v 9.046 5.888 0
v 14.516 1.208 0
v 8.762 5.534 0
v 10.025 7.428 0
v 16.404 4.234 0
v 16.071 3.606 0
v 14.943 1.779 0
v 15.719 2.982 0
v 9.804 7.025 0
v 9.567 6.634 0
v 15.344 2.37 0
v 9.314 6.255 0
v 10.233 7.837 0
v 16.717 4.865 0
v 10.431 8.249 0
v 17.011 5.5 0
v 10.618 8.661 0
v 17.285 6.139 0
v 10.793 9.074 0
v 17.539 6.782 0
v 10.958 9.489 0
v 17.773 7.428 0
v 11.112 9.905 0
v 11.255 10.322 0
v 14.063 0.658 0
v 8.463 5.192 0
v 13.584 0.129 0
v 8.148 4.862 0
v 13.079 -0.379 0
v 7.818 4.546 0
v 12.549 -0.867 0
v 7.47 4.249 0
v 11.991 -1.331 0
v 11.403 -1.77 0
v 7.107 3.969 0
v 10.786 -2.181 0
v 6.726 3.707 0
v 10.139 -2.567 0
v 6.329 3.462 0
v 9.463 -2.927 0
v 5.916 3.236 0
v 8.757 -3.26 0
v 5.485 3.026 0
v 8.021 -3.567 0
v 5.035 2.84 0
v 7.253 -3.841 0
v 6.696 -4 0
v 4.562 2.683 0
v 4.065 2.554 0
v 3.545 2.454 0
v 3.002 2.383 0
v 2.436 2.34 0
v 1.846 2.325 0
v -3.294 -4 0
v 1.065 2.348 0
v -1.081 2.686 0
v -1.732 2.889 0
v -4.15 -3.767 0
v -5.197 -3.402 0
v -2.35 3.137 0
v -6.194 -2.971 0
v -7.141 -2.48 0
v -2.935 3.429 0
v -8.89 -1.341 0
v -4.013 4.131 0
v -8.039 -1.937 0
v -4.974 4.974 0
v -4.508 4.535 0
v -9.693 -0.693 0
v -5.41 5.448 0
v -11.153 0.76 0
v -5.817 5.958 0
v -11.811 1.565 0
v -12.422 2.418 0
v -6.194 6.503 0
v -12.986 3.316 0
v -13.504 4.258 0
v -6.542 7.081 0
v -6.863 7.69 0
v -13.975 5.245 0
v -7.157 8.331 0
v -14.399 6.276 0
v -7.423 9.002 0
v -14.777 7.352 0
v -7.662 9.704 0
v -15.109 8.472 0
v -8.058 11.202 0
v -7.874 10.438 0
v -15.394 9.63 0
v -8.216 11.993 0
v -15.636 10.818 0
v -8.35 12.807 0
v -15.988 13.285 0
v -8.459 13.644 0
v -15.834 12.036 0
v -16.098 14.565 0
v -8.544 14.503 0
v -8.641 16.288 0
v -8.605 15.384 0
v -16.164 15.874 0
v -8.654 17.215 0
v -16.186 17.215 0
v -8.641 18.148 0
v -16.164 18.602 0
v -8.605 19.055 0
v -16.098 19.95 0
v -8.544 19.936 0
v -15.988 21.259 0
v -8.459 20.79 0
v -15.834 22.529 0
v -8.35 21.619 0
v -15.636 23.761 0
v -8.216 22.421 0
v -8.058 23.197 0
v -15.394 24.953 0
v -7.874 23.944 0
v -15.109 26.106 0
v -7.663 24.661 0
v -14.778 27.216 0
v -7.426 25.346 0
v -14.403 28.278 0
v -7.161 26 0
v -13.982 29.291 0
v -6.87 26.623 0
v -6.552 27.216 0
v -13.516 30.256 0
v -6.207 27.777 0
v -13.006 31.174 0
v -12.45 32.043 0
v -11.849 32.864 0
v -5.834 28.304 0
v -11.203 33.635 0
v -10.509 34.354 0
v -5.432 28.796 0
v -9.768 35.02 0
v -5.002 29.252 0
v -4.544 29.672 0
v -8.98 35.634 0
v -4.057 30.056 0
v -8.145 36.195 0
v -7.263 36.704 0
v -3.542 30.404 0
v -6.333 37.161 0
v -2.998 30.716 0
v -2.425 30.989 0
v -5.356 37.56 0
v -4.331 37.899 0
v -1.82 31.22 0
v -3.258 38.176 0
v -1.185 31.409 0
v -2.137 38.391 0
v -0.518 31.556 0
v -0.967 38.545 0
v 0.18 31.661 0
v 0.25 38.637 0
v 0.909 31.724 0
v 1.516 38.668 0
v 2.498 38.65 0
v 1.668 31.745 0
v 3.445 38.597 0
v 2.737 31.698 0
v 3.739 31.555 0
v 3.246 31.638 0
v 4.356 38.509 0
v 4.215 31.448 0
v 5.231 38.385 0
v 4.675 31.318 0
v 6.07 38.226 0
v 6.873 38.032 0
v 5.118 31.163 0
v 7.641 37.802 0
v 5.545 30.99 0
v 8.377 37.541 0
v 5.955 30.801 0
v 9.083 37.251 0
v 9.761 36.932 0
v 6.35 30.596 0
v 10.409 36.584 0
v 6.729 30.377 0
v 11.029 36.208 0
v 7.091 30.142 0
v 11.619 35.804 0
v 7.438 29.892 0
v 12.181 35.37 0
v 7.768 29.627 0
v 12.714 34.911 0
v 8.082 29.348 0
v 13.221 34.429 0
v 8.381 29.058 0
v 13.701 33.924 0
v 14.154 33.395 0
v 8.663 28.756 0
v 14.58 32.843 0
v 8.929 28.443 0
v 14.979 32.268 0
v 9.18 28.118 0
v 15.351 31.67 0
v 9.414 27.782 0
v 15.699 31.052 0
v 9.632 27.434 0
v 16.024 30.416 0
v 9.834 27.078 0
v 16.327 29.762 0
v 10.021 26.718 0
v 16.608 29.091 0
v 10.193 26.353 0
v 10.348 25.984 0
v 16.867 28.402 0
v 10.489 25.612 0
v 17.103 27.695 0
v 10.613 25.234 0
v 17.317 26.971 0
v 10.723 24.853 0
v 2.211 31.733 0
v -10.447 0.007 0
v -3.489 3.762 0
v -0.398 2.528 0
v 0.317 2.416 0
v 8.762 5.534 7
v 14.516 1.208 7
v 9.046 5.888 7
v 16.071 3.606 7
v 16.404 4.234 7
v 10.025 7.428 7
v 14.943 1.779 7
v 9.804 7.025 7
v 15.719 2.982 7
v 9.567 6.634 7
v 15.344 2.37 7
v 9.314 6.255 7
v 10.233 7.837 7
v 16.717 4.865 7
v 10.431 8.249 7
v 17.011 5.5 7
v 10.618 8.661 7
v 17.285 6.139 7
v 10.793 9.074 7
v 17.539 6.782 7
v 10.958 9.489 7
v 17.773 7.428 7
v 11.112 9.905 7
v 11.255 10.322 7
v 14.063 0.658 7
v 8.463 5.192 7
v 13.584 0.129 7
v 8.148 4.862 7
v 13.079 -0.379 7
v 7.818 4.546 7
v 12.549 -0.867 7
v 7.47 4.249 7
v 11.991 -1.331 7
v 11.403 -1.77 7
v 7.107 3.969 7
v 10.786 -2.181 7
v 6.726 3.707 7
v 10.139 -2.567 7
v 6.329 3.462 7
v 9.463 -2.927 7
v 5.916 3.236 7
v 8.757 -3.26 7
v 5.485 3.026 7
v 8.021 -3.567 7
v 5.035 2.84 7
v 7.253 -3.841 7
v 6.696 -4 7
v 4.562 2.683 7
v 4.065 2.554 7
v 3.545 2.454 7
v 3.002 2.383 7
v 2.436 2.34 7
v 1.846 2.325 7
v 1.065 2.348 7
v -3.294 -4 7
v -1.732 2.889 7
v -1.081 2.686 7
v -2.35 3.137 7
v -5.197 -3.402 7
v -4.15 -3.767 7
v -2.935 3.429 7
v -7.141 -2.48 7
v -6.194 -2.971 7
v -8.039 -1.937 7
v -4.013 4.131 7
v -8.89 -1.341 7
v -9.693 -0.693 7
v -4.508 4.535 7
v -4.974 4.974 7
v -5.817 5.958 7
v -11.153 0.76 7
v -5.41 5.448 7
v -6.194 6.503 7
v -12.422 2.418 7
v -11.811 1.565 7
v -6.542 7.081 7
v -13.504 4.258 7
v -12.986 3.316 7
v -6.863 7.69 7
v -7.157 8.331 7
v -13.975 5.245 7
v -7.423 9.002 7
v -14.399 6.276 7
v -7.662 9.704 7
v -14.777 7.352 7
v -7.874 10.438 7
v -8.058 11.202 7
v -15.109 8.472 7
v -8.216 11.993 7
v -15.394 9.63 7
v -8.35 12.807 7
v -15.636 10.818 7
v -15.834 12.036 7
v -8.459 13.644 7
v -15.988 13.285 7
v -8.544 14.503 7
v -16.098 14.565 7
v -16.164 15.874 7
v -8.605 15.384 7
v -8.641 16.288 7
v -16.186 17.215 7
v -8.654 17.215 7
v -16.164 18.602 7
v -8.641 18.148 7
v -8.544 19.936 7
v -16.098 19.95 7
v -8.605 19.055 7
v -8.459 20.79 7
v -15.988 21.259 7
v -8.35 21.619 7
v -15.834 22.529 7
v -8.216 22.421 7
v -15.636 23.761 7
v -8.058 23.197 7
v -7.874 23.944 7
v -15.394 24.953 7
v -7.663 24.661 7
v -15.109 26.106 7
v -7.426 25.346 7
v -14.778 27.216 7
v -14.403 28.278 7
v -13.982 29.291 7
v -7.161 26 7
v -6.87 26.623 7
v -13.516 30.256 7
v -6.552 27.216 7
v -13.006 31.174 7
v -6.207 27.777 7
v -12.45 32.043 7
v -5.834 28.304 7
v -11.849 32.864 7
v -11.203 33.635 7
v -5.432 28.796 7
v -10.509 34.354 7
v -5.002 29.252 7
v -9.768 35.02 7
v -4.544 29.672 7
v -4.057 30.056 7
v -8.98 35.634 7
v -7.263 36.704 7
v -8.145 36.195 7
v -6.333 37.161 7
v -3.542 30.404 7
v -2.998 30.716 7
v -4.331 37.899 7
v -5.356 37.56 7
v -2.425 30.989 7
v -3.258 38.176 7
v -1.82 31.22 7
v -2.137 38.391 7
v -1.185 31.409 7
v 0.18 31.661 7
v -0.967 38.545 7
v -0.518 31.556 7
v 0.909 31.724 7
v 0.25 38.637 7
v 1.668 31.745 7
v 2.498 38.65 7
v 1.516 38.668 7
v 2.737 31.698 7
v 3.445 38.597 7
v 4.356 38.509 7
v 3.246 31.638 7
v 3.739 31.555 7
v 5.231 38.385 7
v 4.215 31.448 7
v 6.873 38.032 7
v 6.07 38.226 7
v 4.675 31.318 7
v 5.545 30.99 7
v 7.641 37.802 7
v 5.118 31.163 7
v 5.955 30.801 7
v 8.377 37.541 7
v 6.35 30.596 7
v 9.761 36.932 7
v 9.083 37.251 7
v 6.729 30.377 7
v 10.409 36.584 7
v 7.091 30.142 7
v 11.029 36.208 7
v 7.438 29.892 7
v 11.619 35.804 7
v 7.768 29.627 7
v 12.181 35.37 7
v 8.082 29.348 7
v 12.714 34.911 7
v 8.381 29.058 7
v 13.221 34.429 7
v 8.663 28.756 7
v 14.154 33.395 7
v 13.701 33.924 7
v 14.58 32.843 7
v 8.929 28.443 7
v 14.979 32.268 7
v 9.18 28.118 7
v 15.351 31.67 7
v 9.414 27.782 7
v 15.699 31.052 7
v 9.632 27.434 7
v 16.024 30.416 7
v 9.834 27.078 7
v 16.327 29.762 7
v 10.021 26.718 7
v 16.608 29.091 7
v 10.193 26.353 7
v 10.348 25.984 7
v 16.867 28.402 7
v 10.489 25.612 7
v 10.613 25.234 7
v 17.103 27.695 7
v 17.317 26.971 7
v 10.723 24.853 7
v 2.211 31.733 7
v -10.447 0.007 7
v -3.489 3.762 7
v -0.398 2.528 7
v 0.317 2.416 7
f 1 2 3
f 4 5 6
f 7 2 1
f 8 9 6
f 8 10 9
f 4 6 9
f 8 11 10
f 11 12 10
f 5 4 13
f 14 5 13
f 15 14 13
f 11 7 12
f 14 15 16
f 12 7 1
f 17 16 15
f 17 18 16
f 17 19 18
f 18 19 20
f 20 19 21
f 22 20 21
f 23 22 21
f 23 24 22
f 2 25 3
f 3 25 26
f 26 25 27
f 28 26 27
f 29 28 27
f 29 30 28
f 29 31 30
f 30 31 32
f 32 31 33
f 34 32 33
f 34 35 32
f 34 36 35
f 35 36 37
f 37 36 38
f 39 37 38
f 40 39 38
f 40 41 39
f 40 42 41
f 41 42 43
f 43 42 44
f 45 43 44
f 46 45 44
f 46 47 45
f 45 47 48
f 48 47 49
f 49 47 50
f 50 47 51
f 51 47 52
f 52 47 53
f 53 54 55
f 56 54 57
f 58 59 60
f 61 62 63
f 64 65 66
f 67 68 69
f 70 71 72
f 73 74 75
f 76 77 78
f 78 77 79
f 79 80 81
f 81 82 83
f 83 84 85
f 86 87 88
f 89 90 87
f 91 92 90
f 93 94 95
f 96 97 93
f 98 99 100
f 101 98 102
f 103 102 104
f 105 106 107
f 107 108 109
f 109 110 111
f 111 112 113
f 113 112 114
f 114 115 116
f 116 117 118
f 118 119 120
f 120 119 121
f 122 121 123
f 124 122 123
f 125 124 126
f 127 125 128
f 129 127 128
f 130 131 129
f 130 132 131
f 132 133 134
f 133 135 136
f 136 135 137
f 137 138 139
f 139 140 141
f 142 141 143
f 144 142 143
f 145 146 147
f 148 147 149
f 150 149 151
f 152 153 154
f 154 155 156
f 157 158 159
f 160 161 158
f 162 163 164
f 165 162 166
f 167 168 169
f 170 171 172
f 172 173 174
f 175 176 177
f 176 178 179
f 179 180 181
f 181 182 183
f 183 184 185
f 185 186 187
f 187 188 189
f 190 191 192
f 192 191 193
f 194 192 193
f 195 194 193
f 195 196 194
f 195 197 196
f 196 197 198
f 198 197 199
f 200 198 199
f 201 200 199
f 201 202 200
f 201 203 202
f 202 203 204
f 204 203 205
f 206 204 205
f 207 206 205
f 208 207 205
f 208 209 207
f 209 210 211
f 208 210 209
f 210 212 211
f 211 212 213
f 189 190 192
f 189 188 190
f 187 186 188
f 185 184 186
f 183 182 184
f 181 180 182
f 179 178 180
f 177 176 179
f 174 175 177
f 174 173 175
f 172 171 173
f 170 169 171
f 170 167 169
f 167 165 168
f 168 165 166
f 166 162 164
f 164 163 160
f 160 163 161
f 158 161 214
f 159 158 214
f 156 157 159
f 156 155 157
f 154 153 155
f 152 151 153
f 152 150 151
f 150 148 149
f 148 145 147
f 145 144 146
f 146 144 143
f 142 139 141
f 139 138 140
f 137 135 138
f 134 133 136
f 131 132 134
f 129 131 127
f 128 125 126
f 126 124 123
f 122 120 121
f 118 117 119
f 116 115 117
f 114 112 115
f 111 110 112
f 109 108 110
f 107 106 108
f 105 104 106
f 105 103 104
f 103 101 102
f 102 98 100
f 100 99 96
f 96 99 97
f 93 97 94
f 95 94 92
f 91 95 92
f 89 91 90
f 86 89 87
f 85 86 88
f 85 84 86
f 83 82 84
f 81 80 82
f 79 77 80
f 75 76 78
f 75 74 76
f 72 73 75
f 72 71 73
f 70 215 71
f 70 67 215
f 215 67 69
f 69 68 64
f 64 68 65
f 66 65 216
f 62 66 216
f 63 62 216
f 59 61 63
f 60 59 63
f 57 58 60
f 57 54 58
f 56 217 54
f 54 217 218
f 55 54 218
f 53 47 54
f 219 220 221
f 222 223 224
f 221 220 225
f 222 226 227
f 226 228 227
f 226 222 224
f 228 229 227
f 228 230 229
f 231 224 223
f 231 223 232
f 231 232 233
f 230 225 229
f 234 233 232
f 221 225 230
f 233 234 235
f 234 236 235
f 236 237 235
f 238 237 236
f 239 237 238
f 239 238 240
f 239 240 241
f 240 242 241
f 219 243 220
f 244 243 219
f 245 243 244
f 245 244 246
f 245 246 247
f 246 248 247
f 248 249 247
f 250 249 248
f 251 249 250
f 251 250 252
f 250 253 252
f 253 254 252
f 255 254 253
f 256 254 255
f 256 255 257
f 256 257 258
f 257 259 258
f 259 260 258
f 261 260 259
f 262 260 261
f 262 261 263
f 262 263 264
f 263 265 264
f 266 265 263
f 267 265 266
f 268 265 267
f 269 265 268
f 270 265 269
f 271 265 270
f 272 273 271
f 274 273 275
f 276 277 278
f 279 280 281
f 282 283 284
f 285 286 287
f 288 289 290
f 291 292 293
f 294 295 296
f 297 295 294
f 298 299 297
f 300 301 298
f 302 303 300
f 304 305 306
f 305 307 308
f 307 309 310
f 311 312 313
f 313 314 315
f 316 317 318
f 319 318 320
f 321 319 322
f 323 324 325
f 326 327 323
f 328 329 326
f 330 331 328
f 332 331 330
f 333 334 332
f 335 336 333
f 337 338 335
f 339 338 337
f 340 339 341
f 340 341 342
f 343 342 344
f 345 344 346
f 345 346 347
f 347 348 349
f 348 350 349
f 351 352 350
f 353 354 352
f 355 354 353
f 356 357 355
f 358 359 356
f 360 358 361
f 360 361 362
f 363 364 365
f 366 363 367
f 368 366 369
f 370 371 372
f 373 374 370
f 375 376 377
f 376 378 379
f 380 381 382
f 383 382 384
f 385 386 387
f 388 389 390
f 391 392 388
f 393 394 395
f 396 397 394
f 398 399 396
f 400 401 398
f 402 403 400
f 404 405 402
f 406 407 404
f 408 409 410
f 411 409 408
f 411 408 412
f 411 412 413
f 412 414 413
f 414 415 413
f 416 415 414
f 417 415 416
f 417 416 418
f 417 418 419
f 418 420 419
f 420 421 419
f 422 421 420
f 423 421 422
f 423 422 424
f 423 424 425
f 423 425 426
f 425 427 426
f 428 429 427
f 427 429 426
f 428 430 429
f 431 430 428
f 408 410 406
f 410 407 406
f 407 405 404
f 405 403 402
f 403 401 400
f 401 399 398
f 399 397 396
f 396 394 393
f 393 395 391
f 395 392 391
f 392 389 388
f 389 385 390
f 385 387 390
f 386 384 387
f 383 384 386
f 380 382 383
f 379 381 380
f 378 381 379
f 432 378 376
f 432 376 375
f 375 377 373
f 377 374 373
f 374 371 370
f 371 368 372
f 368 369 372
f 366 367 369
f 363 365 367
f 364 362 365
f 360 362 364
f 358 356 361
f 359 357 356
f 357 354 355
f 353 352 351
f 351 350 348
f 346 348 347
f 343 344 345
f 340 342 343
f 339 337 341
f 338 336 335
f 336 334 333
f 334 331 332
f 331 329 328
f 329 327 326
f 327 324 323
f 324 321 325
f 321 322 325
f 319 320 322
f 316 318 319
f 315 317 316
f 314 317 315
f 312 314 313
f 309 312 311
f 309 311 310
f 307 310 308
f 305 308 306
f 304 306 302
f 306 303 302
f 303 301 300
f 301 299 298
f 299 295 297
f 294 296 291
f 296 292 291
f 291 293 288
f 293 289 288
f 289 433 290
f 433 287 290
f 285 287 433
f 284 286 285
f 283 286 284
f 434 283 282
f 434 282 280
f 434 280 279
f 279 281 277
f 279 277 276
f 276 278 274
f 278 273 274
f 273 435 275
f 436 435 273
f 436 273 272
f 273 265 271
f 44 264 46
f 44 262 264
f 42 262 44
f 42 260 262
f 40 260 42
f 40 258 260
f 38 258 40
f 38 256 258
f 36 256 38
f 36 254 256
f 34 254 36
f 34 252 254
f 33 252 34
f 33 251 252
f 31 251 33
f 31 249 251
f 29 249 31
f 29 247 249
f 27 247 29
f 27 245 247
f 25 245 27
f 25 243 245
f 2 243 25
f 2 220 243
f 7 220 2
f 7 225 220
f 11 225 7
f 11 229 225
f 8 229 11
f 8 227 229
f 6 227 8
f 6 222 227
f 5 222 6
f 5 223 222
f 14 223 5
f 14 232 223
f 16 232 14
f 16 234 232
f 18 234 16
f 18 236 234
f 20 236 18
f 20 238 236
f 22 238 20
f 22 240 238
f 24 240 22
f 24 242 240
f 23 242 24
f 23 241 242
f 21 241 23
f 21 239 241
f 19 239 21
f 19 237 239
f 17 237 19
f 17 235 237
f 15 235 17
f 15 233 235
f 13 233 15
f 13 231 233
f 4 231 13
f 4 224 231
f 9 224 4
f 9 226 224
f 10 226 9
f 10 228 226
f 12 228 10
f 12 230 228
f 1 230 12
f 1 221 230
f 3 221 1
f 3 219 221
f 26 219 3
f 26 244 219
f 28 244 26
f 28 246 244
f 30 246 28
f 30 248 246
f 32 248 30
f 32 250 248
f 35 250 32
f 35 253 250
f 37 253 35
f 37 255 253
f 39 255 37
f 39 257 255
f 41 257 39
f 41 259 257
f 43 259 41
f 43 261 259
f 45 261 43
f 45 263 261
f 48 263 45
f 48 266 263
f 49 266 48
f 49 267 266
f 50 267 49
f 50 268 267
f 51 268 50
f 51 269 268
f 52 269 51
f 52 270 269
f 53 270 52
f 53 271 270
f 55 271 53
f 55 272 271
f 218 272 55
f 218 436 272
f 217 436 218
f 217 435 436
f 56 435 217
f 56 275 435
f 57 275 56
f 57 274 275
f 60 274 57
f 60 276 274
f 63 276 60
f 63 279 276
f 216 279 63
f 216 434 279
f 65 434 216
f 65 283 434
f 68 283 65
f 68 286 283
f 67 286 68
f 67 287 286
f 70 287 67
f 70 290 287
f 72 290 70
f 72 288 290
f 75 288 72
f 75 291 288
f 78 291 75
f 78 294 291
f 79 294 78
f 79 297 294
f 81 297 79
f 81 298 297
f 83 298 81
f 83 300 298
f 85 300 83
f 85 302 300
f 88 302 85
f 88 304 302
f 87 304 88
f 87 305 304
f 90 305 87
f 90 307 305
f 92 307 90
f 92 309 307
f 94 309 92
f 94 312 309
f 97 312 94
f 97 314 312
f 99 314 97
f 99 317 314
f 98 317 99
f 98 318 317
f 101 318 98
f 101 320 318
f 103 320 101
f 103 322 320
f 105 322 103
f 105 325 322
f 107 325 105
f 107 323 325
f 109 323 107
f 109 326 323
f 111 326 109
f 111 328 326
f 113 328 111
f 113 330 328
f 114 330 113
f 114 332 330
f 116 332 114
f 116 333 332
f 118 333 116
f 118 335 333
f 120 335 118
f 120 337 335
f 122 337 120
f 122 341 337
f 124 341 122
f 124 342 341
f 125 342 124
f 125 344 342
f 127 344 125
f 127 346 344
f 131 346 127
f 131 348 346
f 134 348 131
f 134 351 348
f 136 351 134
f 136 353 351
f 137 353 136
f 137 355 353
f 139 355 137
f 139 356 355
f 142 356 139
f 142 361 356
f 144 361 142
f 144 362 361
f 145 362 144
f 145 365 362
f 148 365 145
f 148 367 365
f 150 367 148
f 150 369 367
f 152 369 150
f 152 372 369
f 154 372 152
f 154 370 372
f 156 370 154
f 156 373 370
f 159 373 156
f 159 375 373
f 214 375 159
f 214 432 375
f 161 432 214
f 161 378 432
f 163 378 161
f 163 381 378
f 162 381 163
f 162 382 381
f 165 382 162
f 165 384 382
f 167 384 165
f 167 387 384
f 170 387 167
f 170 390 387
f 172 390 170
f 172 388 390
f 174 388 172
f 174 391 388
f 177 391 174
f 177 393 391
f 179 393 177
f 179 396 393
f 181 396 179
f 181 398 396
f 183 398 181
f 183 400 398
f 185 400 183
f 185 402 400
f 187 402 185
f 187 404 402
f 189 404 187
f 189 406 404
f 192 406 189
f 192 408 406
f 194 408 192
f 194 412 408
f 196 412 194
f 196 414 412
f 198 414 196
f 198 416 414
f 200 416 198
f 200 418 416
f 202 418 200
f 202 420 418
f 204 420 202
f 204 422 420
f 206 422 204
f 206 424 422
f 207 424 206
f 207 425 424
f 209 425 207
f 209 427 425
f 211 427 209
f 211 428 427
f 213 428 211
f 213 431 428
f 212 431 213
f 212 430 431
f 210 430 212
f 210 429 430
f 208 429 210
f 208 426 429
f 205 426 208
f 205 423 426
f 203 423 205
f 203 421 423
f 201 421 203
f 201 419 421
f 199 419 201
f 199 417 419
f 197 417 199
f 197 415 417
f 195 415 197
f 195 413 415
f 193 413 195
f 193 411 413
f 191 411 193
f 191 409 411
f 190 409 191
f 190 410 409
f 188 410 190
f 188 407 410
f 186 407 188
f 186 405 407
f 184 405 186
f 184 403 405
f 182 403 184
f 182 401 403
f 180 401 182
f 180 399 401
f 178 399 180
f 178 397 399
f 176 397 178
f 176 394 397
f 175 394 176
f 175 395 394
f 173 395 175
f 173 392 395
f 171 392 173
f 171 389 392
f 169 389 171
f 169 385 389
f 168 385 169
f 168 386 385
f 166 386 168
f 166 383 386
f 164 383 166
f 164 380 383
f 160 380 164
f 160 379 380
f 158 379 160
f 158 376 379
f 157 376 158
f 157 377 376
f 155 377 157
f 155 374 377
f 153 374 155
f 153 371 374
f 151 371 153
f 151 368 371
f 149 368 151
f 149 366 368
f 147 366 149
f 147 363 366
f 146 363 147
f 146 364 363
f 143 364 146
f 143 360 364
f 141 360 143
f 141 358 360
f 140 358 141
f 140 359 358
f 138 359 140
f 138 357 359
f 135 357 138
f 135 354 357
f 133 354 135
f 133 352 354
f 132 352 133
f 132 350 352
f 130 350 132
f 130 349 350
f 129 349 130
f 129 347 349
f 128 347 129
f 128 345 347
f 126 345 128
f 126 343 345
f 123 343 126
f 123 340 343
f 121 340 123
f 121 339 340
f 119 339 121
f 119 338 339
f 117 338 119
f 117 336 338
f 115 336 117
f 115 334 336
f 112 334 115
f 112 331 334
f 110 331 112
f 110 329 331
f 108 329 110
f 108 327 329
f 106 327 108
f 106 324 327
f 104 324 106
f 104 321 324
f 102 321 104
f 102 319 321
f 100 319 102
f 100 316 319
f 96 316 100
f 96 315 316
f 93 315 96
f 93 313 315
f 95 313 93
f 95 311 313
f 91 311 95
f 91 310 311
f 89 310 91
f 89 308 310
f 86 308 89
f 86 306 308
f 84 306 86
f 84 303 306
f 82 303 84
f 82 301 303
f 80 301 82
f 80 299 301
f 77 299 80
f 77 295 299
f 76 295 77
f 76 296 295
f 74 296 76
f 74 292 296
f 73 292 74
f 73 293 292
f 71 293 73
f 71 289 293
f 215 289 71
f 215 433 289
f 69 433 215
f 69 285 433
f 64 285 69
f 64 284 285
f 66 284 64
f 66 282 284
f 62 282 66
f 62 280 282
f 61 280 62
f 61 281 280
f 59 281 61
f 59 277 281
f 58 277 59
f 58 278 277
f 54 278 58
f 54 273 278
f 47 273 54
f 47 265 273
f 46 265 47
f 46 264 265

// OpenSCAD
// file: glyph.scad
// glyph — the shared geometry of every letter in the set. Defines named geometry
// only, so it renders nothing on its own; each letter part includes it and calls
// letter(). Every dimension lives in ../../lib/common.scad.
//
// A LETTER IS NOTHING BUT A LETTER. No plinth, no tongue, no tab — it is the
// bare glyph, and it attaches by standing in the deck groove and resting on the
// groove's floor. Anything else on it would be a distraction on a learning toy.
//
// It is a flat plate of one thickness, printed face-down: no overhang anywhere,
// no supports, and the face on the bed comes out smoothest.
//
// TWO TRAPS WITH text():
//
//  * A missing font FALLS BACK SILENTLY — no warning, no error, just different
//    letters. "Liberation Sans" was the first choice here because OpenSCAD
//    bundles it; on macOS the bundled faces are not registered with fontconfig,
//    so it rendered the fallback face instead and nothing said so. To check a
//    font resolved, render a string with it and with a deliberately bogus name
//    and compare bounding boxes: identical means it fell back.
//  * `size` is not the cap height in general. For Helvetica Bold they coincide
//    (size 44 -> 44.0 mm cap), which is why letter_size reads as a height.
//    Change the font and re-measure.

include <../../lib/common.scad>

// The letter's outline, upright in the XY plane, ready to be extruded along Z
// (which is the letter's thickness, and the print's build axis).
//
//   y = 0   is the deck surface
//   y < 0   is the part standing down inside the groove. It reaches letter_bury,
//           which is where the tapered groove closes to letter_t — NOT the
//           groove's floor. The letter wedges; it never bottoms out.
module glyph_2d(ch) {
    intersection() {
        translate([0, -letter_bury])
            scale([letter_condense, 1])
                text(ch, size = letter_size, font = letter_font,
                     halign = "center", valign = "baseline");
        // Trimmed flat at the baseline. Round letters (O, C, G, S) overshoot the
        // baseline by design, and a letter standing on a convex curve rocks —
        // there is nothing to stop it leaning. The trim costs nothing visible
        // and gives every letter a flat foot on the groove floor.
        translate([-200, -letter_bury]) square([400, 400]);
    }
}

// One letter, in its print orientation: lying on its face, thickness up Z.
module letter(ch) {
    linear_extrude(letter_t) glyph_2d(ch);
}

// Where that letter sits once it is dropped into a chassis, for fit checks.
module letter_fitted(ch) {
    translate([0, letter_t/2, body_top]) rotate([90, 0, 0]) letter(ch);
}
// main file
// letter C — one part. See glyph.scad for the geometry and lib/common.scad for
// the dimensions. Prints lying on its face, exactly as exported: no supports.

include <glyph.scad>

letter("C");
